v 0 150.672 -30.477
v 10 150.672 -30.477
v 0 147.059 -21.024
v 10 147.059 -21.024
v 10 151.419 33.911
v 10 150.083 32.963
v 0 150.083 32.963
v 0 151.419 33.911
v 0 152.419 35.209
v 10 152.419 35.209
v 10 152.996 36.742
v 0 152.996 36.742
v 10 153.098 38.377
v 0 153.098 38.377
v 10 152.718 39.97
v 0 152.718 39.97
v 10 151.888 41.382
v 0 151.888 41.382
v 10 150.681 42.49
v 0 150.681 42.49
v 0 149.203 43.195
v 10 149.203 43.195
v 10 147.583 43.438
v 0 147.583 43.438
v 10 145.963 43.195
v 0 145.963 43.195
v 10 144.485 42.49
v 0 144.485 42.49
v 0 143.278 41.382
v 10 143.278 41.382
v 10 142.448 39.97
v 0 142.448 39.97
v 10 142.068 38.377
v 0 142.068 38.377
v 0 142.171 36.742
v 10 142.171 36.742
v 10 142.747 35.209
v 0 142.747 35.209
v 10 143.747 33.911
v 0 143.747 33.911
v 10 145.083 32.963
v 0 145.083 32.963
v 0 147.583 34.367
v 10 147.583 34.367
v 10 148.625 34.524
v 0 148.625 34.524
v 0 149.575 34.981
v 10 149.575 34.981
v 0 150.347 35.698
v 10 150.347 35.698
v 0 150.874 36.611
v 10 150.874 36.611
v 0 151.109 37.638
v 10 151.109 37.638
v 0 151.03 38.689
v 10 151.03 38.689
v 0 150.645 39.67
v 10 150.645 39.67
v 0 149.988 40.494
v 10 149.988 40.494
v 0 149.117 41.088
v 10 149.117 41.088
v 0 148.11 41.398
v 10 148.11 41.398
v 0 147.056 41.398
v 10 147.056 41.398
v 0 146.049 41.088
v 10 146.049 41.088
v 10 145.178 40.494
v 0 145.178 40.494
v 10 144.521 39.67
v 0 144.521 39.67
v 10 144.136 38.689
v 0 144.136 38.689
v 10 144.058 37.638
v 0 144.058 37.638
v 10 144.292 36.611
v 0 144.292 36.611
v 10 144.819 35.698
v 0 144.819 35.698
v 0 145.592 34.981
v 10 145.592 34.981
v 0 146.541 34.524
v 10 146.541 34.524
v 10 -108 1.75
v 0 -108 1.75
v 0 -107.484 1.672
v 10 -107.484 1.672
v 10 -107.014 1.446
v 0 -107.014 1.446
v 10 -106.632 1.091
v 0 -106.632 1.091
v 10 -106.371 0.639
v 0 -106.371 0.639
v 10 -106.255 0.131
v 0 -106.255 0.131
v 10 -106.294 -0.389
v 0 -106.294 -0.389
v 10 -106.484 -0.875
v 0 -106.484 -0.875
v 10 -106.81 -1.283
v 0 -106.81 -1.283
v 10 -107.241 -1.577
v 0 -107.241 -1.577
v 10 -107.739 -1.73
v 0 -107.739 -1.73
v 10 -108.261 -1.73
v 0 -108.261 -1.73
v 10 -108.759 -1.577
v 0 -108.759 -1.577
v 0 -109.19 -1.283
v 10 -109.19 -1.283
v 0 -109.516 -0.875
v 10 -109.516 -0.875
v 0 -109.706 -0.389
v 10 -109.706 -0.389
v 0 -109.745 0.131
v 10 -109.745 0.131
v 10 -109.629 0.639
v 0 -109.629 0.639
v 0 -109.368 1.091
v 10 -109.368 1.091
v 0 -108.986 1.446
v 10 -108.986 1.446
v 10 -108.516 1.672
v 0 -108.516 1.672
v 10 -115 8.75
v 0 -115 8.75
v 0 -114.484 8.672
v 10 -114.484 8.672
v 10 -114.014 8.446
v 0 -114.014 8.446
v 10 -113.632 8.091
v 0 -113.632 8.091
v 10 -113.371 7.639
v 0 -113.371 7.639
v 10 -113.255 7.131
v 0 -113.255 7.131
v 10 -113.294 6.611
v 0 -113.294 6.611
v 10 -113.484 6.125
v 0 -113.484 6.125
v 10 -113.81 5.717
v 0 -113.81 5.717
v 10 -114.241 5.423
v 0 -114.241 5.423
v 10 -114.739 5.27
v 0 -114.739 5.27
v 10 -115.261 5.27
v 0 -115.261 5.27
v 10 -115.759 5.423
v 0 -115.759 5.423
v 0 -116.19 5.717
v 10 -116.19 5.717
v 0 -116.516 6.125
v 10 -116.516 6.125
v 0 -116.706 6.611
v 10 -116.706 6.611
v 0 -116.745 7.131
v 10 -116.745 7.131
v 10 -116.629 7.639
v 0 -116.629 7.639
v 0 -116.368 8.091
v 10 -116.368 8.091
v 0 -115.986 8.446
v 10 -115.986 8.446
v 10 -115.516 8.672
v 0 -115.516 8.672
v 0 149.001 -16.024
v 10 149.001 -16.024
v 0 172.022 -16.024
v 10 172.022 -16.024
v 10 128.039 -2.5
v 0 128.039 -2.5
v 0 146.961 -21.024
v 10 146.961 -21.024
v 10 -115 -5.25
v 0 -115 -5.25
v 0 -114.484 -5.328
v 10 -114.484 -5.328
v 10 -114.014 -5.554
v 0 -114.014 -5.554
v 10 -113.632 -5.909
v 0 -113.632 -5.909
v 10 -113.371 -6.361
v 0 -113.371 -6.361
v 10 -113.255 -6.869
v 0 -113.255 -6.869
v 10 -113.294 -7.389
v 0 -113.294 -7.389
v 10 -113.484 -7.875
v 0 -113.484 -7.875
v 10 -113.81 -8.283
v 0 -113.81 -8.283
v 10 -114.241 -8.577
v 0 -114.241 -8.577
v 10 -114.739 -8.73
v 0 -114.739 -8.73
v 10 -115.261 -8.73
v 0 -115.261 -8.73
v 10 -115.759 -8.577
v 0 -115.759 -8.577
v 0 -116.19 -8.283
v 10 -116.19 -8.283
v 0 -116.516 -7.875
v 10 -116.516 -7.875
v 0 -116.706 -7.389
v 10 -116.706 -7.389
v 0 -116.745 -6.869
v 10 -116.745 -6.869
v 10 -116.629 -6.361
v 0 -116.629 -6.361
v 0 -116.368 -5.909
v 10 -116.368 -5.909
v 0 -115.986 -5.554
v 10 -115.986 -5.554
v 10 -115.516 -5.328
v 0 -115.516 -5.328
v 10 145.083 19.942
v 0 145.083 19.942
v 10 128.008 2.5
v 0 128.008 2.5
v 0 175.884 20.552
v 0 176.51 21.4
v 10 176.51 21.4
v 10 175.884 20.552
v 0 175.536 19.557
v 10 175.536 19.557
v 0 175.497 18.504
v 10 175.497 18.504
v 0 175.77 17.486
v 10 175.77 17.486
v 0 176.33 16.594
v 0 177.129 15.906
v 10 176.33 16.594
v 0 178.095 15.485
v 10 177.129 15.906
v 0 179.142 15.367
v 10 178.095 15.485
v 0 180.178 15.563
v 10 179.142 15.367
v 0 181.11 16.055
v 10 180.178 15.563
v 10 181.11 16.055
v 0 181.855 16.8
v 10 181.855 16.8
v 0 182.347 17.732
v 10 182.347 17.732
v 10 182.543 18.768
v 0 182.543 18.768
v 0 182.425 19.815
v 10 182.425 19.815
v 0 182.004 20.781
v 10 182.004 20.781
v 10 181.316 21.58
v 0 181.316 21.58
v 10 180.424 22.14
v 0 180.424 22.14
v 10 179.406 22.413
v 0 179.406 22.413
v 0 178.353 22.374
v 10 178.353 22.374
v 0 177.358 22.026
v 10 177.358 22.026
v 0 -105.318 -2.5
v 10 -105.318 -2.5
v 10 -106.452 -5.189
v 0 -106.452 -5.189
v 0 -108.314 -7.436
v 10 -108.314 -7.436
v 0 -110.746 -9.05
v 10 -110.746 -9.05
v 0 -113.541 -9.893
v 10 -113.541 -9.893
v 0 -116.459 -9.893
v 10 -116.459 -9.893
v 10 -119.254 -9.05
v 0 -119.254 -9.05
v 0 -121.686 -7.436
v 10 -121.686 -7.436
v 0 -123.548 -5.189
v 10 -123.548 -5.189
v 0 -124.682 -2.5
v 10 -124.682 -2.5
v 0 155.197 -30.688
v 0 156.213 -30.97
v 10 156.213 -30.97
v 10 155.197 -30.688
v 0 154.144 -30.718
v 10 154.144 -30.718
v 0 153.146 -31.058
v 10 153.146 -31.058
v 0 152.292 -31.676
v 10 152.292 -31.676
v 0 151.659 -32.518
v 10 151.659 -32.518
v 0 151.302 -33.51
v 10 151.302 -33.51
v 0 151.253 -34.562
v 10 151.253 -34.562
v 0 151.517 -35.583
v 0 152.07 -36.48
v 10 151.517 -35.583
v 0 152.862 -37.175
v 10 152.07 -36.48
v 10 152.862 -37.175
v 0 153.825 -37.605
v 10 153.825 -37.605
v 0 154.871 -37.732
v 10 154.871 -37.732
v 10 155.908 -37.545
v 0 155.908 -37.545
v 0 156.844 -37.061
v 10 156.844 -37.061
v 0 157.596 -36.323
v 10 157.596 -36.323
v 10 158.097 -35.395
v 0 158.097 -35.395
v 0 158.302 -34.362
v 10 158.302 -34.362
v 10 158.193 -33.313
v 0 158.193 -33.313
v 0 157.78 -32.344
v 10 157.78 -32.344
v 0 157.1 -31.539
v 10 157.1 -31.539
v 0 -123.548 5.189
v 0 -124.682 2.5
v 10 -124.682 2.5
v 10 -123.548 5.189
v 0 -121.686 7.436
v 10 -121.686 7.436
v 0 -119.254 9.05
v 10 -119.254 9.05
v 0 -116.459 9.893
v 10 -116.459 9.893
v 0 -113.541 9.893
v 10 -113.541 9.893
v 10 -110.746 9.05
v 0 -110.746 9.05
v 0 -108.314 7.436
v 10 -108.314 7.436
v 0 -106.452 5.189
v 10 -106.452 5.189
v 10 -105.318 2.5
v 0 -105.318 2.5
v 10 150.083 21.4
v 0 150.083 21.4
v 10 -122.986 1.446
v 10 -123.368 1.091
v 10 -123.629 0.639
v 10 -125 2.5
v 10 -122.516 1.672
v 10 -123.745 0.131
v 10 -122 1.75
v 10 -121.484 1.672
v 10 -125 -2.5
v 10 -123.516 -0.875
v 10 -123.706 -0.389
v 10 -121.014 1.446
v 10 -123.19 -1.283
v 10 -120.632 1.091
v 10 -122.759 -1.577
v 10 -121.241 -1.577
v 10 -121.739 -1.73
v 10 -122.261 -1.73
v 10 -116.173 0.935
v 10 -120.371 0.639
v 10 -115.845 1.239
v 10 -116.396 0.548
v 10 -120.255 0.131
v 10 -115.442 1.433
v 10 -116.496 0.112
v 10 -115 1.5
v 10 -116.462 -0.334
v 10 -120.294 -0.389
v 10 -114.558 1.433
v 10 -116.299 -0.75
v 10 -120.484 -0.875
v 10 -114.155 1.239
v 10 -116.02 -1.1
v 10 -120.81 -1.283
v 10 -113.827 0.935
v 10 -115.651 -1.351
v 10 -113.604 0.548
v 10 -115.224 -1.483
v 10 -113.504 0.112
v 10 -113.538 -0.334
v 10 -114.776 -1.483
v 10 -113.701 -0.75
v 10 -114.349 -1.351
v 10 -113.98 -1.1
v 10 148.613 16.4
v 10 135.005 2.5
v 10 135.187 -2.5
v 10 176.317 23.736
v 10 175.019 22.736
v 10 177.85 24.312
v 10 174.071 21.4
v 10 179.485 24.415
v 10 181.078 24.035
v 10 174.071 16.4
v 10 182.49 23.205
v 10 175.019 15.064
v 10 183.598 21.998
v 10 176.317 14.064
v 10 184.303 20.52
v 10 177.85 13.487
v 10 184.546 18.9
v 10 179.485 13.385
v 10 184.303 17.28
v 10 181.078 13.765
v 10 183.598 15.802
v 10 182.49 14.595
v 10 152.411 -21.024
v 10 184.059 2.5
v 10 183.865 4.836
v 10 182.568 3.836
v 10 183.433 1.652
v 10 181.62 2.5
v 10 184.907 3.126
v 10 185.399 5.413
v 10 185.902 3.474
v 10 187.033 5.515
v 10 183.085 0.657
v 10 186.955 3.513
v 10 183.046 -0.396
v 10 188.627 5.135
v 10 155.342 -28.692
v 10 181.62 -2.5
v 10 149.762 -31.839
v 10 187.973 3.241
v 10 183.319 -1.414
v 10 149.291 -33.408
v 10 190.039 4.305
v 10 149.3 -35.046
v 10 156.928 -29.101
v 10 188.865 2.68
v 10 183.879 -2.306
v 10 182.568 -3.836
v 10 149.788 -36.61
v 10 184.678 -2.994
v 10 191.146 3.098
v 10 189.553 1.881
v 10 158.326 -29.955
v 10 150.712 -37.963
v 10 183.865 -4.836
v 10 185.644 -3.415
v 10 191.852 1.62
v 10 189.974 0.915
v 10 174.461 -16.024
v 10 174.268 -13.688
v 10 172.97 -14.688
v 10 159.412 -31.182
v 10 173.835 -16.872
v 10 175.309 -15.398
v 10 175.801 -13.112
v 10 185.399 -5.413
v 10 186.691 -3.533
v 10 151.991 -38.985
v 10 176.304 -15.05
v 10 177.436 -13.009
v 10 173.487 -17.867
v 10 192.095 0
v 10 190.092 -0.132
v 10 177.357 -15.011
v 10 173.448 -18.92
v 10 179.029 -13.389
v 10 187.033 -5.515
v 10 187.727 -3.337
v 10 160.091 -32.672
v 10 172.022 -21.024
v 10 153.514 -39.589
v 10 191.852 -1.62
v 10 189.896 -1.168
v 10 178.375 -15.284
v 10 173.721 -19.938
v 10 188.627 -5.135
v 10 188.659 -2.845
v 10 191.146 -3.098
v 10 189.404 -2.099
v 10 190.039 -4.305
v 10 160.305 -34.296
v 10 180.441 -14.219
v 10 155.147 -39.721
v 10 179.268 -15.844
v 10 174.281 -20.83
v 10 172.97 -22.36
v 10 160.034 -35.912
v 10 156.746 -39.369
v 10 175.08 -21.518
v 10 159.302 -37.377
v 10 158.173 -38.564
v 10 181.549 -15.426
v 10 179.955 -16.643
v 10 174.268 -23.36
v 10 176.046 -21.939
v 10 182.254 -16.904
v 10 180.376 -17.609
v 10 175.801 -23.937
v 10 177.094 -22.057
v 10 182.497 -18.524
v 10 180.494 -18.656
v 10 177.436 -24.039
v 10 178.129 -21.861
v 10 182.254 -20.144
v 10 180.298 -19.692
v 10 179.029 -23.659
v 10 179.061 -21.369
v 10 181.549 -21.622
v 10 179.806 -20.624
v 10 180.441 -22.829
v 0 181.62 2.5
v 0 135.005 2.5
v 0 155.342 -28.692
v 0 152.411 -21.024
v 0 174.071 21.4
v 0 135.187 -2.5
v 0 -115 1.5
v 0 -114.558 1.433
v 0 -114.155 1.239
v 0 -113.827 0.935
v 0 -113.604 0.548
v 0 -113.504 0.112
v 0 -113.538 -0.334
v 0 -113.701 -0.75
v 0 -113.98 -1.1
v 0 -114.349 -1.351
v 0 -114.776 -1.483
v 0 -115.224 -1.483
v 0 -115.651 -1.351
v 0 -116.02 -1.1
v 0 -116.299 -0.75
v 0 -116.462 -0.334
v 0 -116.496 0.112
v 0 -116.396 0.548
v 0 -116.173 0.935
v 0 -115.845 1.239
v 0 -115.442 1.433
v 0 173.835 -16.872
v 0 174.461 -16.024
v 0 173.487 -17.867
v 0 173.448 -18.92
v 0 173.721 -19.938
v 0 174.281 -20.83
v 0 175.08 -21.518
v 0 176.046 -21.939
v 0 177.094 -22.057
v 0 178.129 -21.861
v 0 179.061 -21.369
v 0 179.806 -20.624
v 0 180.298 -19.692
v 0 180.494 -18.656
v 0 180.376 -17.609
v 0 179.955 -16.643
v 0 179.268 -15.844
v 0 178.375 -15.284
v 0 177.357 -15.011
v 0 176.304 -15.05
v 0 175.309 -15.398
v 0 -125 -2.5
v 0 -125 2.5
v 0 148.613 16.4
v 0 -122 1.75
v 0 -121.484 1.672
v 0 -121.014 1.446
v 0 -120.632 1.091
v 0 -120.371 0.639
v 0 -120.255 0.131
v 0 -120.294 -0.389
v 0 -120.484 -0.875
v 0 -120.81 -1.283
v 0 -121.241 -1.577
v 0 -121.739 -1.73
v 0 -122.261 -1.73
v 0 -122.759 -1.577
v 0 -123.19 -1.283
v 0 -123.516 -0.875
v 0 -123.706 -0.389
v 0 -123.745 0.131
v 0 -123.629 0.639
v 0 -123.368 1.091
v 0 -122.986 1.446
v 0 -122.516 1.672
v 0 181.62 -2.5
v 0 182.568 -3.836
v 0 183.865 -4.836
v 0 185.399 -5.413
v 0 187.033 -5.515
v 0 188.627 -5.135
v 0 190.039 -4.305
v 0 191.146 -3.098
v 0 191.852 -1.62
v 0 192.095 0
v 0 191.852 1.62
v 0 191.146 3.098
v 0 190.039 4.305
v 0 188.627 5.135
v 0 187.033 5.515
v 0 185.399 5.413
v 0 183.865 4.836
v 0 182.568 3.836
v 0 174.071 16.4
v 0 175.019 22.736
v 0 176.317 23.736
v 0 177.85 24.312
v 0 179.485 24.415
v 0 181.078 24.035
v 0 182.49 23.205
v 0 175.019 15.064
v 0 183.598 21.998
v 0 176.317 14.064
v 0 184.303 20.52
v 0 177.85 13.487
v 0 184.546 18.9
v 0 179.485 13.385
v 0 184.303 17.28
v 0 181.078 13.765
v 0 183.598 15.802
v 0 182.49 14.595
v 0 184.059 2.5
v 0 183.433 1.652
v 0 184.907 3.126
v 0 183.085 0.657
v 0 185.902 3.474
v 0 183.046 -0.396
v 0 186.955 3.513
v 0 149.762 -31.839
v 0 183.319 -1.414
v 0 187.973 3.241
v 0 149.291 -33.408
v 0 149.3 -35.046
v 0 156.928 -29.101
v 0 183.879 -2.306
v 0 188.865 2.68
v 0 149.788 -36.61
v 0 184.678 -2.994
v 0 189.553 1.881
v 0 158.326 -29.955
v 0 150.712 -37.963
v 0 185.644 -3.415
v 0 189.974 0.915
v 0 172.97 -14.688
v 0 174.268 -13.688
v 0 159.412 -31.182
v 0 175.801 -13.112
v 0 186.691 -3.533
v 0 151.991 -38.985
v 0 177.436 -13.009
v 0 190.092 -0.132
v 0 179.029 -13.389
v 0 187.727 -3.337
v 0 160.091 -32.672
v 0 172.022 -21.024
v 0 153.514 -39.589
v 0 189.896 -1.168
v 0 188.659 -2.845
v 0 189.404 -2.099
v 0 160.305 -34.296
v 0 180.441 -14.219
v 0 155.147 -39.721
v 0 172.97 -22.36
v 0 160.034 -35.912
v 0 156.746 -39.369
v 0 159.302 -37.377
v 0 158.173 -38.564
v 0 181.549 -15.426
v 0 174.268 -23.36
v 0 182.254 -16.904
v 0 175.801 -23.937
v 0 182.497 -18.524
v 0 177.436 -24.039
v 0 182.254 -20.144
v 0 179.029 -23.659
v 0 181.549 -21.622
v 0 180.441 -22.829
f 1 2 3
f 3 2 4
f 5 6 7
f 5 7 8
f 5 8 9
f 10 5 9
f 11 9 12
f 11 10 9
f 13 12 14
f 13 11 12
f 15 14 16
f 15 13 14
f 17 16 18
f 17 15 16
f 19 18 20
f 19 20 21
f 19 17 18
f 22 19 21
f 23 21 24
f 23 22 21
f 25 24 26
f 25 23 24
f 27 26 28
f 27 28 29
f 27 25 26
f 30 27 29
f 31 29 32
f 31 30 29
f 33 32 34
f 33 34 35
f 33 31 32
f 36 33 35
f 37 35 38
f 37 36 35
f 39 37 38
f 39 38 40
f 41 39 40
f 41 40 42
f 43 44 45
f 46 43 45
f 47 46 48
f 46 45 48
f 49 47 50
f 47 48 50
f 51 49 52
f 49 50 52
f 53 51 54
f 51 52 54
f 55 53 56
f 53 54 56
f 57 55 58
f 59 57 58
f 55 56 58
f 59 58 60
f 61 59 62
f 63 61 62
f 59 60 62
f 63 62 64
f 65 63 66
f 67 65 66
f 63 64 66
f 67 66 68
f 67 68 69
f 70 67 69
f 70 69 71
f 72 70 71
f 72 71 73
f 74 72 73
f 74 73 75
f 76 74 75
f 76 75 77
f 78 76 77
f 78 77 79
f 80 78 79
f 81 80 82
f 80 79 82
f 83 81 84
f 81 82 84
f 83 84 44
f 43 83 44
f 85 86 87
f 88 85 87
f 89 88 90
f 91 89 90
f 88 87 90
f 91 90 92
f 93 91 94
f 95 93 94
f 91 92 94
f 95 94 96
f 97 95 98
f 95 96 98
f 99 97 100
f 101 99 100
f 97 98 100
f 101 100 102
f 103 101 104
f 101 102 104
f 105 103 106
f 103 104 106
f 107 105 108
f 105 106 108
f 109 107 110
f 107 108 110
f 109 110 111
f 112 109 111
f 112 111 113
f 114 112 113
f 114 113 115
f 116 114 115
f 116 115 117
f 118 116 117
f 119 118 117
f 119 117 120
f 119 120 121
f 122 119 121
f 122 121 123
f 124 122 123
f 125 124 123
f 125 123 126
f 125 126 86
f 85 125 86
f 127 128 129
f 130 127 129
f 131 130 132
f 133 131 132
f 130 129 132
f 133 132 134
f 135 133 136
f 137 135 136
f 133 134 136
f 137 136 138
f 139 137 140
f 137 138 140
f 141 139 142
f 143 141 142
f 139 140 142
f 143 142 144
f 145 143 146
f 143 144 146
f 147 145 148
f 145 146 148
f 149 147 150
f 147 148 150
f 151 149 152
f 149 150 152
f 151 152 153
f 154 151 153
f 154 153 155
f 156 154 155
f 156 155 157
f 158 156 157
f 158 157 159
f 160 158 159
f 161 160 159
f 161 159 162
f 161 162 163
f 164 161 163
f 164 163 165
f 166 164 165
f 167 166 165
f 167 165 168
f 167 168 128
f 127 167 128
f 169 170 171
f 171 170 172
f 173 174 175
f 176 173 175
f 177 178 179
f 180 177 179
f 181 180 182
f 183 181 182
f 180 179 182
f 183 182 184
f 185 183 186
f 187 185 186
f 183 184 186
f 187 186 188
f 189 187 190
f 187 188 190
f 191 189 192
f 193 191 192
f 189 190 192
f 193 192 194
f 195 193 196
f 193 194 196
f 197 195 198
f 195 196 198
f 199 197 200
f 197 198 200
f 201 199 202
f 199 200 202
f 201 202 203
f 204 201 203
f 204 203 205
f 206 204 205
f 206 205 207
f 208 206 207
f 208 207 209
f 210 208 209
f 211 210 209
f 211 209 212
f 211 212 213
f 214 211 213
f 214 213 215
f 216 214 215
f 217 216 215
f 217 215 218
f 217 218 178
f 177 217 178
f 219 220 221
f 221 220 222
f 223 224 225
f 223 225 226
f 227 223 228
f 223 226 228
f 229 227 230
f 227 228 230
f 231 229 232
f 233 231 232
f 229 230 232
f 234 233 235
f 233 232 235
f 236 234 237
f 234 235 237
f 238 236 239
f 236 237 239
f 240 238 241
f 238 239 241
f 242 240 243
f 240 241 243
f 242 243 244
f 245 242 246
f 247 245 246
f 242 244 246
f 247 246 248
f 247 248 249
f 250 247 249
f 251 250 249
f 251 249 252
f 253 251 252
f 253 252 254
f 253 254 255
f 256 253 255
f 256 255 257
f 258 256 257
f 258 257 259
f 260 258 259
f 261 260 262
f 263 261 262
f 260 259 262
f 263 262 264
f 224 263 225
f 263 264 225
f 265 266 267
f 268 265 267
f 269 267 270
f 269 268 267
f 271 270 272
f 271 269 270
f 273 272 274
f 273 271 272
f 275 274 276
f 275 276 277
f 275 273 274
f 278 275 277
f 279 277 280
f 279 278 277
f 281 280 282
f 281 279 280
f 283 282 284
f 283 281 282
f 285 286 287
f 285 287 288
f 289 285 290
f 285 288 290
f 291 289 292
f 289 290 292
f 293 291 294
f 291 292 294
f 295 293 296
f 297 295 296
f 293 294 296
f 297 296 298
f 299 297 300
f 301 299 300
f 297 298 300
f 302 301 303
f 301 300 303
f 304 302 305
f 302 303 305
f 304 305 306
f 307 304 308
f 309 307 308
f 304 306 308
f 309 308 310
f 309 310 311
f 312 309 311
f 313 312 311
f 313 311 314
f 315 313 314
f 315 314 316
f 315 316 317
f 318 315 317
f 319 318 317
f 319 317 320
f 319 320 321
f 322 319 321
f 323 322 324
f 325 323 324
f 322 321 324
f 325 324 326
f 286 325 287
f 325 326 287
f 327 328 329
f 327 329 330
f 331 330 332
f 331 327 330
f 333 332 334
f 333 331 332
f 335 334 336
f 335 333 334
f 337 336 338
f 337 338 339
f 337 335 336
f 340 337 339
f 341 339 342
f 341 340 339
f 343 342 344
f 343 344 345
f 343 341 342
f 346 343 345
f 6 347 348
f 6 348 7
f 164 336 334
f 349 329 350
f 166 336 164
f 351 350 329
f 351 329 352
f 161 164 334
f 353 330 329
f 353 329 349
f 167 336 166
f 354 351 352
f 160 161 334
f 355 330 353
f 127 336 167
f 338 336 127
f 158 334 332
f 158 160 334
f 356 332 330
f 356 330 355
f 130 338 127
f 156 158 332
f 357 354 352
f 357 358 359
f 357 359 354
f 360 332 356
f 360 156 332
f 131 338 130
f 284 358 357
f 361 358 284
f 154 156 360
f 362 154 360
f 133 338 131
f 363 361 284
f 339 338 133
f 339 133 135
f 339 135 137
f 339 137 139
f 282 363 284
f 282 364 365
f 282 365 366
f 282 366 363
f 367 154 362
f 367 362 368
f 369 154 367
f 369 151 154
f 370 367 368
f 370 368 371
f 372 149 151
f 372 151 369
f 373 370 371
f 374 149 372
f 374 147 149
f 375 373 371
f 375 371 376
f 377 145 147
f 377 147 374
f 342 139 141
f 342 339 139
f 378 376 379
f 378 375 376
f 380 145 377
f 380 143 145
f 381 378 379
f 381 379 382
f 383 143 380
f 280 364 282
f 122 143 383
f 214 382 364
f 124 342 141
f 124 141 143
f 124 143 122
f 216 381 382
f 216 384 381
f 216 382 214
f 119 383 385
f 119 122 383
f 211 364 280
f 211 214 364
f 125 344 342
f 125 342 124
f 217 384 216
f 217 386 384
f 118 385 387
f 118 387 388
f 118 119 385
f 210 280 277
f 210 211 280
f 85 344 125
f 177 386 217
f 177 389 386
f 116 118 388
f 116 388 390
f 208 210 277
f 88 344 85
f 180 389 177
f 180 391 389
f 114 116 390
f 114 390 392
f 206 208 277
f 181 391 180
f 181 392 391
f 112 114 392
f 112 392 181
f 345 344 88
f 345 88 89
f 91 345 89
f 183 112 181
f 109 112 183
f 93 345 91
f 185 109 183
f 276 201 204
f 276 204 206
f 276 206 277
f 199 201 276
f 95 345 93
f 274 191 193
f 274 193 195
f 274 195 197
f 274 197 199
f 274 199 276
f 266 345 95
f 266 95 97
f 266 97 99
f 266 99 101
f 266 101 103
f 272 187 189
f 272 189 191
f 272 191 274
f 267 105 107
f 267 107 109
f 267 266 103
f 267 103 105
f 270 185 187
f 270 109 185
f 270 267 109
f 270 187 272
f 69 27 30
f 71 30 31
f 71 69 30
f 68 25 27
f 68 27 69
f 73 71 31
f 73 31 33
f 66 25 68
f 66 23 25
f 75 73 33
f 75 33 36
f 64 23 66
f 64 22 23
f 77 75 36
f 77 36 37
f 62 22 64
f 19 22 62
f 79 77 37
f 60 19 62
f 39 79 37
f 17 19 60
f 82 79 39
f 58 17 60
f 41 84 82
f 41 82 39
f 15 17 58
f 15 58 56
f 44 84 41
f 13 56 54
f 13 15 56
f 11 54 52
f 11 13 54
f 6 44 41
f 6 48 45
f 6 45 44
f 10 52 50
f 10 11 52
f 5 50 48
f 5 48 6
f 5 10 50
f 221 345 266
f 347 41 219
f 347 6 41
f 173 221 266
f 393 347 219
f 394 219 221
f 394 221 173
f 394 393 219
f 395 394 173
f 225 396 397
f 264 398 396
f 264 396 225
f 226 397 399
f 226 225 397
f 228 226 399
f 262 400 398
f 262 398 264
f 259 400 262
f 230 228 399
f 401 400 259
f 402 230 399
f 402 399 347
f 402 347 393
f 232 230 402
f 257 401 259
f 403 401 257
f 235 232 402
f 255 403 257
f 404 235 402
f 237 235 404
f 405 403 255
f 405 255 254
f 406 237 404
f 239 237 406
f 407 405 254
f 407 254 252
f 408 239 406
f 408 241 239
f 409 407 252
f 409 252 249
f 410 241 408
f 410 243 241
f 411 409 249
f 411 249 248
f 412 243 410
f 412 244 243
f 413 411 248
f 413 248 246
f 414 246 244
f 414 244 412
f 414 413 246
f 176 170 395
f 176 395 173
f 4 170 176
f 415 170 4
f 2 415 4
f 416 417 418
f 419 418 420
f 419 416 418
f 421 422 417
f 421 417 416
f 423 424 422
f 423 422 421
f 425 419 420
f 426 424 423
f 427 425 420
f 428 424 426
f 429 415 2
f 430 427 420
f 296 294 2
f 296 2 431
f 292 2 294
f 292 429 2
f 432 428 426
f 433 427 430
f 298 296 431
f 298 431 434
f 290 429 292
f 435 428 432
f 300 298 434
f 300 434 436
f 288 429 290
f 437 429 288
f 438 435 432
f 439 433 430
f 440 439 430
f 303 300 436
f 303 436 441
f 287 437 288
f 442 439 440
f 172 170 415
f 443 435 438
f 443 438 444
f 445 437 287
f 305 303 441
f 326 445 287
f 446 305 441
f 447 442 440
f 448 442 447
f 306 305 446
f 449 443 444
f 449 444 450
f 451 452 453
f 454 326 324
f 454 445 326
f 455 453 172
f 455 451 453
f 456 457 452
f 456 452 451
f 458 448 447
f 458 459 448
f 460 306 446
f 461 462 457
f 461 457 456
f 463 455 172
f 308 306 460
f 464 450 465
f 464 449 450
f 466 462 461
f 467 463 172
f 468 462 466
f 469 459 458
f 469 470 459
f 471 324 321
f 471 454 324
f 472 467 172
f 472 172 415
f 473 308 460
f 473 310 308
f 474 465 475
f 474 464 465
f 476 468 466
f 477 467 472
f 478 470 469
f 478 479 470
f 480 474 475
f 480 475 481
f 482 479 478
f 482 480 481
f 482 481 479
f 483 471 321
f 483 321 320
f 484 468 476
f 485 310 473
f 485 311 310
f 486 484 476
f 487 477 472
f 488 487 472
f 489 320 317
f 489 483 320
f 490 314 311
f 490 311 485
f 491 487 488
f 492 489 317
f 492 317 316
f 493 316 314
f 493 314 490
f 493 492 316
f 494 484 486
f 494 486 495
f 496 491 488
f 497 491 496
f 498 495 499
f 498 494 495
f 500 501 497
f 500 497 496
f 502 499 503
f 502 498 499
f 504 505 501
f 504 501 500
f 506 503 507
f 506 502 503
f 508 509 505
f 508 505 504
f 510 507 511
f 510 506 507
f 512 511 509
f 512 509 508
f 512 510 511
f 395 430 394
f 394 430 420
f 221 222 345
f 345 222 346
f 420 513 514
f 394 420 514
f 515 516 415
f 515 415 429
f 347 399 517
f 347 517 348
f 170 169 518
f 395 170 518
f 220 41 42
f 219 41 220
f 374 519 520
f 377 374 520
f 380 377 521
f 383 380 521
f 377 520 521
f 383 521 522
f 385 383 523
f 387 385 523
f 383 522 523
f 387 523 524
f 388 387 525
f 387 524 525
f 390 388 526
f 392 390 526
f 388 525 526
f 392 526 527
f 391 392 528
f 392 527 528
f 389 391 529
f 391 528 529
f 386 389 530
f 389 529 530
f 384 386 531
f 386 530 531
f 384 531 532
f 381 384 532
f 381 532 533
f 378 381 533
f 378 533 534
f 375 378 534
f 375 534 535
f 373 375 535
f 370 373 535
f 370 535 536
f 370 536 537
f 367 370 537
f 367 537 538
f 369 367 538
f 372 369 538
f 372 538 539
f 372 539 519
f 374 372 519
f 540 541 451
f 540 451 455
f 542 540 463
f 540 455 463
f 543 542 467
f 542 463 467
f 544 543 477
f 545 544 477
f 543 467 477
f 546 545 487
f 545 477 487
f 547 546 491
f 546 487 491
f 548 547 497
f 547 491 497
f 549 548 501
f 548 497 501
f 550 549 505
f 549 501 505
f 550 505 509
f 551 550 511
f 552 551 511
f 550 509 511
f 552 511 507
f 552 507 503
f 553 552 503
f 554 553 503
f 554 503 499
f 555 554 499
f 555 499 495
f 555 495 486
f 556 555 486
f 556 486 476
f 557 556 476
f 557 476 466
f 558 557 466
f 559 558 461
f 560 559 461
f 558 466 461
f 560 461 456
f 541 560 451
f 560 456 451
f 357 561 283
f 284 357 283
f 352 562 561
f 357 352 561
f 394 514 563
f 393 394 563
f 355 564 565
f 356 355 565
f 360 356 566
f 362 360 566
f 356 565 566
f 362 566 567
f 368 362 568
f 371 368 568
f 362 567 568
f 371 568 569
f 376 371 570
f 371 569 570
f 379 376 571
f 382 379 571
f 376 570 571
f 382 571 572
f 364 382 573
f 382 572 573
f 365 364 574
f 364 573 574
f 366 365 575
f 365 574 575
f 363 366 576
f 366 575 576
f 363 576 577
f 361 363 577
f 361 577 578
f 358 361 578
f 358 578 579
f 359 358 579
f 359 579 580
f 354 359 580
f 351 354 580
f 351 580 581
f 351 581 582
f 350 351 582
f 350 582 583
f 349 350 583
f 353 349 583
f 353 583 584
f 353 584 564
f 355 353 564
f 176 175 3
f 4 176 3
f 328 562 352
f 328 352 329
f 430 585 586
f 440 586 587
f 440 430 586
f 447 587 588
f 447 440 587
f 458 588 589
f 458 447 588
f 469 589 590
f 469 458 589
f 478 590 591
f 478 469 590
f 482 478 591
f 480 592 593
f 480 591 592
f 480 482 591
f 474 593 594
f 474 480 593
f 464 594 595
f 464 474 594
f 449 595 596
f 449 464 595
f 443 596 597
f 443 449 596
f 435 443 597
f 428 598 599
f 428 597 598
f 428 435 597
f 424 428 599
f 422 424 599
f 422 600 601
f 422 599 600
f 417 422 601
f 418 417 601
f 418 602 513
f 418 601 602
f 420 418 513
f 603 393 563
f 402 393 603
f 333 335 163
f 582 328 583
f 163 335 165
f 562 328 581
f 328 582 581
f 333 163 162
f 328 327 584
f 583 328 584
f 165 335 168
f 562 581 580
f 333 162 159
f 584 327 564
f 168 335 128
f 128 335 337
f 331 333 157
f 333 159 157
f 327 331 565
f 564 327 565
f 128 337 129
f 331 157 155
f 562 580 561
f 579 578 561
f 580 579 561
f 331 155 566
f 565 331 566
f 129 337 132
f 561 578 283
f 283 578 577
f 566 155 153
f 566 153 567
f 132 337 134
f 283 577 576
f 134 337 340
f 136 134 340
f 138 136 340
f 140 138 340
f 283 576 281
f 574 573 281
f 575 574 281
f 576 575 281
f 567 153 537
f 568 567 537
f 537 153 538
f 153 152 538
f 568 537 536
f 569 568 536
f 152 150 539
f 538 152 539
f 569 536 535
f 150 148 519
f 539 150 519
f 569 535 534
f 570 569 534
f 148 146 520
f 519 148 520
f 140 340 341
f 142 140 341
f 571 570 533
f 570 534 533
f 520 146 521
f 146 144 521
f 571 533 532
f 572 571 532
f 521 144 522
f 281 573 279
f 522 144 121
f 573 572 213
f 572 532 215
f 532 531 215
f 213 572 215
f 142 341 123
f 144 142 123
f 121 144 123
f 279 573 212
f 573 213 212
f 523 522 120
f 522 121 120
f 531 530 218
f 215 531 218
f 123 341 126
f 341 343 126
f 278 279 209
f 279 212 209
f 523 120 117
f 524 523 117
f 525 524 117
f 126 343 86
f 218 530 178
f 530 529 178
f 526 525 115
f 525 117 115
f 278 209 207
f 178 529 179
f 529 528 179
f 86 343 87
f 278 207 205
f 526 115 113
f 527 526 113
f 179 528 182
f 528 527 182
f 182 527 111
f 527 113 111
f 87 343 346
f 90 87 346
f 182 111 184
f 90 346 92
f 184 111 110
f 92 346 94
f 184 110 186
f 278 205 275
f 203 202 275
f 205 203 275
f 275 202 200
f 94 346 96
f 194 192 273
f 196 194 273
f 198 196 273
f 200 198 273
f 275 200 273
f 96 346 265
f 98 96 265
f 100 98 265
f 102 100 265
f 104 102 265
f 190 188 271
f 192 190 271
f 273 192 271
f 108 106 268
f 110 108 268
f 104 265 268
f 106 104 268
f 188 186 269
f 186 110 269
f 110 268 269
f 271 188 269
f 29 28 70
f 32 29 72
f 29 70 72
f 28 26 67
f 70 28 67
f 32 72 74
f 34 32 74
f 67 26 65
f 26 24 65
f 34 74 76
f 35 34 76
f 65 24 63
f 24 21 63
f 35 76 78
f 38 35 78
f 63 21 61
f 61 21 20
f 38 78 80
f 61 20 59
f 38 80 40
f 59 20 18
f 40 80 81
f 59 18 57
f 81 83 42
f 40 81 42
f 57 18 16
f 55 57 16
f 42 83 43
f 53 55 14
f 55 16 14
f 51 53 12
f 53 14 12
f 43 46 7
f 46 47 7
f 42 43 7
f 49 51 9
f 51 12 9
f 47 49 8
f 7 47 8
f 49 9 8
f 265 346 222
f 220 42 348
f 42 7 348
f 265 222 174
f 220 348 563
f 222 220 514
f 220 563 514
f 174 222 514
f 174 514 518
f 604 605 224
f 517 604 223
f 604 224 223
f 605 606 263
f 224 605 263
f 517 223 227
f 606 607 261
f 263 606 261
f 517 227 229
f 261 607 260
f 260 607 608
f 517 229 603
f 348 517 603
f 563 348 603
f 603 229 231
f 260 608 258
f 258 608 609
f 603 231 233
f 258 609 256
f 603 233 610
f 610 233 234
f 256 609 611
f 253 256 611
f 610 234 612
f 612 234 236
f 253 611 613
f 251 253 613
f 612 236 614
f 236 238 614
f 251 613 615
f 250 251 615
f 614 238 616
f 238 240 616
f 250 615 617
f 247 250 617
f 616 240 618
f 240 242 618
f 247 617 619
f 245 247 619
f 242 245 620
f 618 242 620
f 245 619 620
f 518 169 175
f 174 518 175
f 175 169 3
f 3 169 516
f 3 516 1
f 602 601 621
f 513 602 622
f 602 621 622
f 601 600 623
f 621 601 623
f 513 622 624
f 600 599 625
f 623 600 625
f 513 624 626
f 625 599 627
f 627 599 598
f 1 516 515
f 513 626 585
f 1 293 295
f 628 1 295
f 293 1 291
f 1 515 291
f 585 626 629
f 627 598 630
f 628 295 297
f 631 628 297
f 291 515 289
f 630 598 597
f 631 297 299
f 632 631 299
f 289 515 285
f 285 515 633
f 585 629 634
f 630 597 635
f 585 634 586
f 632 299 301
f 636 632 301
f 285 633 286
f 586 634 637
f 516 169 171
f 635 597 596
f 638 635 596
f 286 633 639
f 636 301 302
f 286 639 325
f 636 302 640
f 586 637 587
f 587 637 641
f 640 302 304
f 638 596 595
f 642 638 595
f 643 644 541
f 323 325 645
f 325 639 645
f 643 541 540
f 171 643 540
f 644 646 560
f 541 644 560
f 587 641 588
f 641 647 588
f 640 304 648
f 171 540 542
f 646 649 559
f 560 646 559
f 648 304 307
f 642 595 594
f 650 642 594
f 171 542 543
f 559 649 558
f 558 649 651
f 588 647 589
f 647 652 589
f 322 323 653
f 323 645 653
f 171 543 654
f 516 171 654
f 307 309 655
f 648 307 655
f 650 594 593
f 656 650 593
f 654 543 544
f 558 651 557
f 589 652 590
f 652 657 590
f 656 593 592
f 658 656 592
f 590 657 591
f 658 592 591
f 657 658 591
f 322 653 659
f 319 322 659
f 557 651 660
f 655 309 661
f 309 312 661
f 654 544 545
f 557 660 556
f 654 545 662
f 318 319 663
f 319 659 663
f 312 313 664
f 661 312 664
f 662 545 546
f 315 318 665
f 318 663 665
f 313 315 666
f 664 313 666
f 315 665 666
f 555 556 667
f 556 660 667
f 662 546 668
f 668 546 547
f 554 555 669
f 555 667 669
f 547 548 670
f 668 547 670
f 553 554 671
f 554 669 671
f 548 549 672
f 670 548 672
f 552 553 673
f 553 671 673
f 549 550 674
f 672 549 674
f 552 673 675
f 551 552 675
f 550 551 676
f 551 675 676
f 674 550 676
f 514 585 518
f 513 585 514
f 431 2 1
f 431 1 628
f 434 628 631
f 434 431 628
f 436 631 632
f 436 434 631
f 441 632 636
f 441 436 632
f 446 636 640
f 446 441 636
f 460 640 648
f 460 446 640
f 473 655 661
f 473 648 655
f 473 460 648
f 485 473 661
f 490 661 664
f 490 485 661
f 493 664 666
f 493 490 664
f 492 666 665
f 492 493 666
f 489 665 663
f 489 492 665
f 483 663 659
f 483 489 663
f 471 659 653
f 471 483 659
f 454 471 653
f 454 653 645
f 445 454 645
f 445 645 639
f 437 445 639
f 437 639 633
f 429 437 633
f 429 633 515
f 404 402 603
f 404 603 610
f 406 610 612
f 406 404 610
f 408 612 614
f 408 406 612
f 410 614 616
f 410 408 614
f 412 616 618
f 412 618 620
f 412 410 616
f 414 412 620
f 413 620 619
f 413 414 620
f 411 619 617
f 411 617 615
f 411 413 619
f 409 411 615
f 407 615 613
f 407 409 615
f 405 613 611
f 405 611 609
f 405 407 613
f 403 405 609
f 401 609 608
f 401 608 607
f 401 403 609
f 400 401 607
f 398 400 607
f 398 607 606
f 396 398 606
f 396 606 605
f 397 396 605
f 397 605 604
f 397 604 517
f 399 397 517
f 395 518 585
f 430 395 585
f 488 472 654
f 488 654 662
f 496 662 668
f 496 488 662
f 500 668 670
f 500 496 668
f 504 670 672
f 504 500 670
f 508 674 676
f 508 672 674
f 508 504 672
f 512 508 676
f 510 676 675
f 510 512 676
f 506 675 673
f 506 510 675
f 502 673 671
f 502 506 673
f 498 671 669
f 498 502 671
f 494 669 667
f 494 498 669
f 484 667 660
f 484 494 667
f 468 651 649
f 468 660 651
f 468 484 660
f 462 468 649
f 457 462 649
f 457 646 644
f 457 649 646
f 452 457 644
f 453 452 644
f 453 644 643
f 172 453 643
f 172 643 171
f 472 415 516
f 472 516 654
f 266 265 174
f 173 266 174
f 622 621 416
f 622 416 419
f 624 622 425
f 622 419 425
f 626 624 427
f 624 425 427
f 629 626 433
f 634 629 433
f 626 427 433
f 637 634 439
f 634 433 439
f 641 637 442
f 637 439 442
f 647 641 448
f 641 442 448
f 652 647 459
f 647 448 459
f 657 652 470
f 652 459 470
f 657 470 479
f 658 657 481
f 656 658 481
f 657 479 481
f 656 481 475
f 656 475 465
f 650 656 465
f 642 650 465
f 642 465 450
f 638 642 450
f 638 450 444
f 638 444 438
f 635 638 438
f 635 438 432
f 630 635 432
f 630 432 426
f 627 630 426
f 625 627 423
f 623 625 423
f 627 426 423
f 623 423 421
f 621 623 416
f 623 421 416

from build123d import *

# Parameters (mm, degrees)
SKETCH1_W           = 5
SKETCH1_H           = 250
BOSS_EXTRUDE1_DEPTH = 10
SKETCH3_R           = 10
BOSS_EXTRUDE2_DEPTH = 10
SKETCH4_R           = 1.5
SKETCH4_R_2         = 1.75
CUT_EXTRUDE1_DEPTH  = 23
EXTRUDE_THIN5_START = -10
EXTRUDE_THIN5_DEPTH = 10
SKETCH10_W          = 5
SKETCH10_H          = 27.5
BOSS_EXTRUDE3_DEPTH = 10
BOSS_EXTRUDE4_DEPTH = 10
SKETCH12_R          = 5.535533906
SKETCH12_R_2        = 3.535533906
EXTRUDE_THIN6_DEPTH = 10
SKETCH14_R          = 3.535533906
CUT_EXTRUDE2_DEPTH  = 10


# Read off the part's stored shape, not the designer's step: Extrude-Thin5
with BuildPart() as part:
    # Sketch1 → Boss-Extrude1 (new body)
    with BuildSketch(Plane(origin=(0, 0, 0), x_dir=(0, 0, -1), z_dir=(1, 0, 0))):
        Rectangle(SKETCH1_W, SKETCH1_H)
    extrude(amount=BOSS_EXTRUDE1_DEPTH)

    # Sketch3 → Boss-Extrude2 (add)
    with BuildSketch(Plane.ZY):
        with Locations((0, -115)):
            Circle(SKETCH3_R)
    extrude(amount=-BOSS_EXTRUDE2_DEPTH)

    # Sketch4 → Cut-Extrude1 (cut)
    with BuildSketch(Plane.ZY):
        with Locations((0, -115)):
            Circle(SKETCH4_R)
        with Locations((-7, -115)):
            Circle(SKETCH4_R_2)
        with Locations((0, -108)):
            Circle(SKETCH4_R_2)
        with Locations((7, -115)):
            Circle(SKETCH4_R_2)
        with Locations((0, -122)):
            Circle(SKETCH4_R_2)
    extrude(amount=-CUT_EXTRUDE1_DEPTH, mode=Mode.SUBTRACT)

    # Extrude-Thin5 outline → Extrude-Thin5 (add)
    with BuildSketch(Plane(origin=(10, 0, 0), x_dir=(0, 0, -1), z_dir=(1, 0, 0)).offset(EXTRUDE_THIN5_START)):
        Polygon((17.451133042, 150.459060521), (2.5, 135.186573848), (2.5, 184.059108288), (-2.5, 184.059108288), (-2.5, 135.005040385), (-17.902207713, 150.083164962), (-21.399952233, 146.51024133), (-2.5, 128.007969476), (-2.5, 125), (2.5, 125), (2.5, 128.039110715), (21.024056673, 146.961316001), align=None)
    extrude(amount=EXTRUDE_THIN5_DEPTH)

    # Sketch10 → Boss-Extrude3 (add)
    with BuildSketch(Plane(origin=(10, 0, 0), x_dir=(0, 0, -1), z_dir=(1, 0, 0))):
        with Locations((18.524056673, 160.711316001)):
            Rectangle(SKETCH10_W, SKETCH10_H)
        Polygon((30.970200678, 156.21277045), (32.755260524, 151.542271403), (18.743763382, 146.187091867), (16.958703537, 150.857590914), align=None)
    extrude(amount=-BOSS_EXTRUDE3_DEPTH)

    # Sketch11 → Boss-Extrude4 (add)
    with BuildSketch(Plane(origin=(10, 0, 0), x_dir=(0, 0, -1), z_dir=(1, 0, 0))):
        Polygon((-21.399952233, 176.51024133), (-21.399952233, 150.083164962), (-17.902207713, 150.083164962), (-16.399952233, 148.612518954), (-16.399952233, 176.51024133), align=None)
        Polygon((-17.902207713, 150.083164962), (-21.399952233, 146.51024133), (-17.902207713, 146.51024133), align=None)
        Polygon((-21.399952233, 150.083164962), (-21.399952233, 146.51024133), (-17.902207713, 150.083164962), align=None)
        Polygon((-17.902207713, 150.083164962), (-17.902207713, 146.51024133), (-16.399952233, 146.51024133), (-16.399952233, 148.612518954), align=None)
        Polygon((-19.942202859, 145.083164962), (-21.399952233, 146.51024133), (-21.399952233, 150.083164962), (-35.402207713, 150.083164962), (-35.402207713, 145.083164962), align=None)
        Polygon((-17.902207713, 146.51024133), (-21.399952233, 146.51024133), (-19.942202859, 145.083164962), (-17.902207713, 145.083164962), align=None)
    extrude(amount=-BOSS_EXTRUDE4_DEPTH)

    # Sketch12 → Extrude-Thin6 (add)
    # profile 1 of 5: a face of its own
    with BuildSketch(Plane(origin=(10, 0, 0), x_dir=(0, 0, -1), z_dir=(1, 0, 0))):
        with Locations((-18.899952233, 179.01024133)):
            Circle(SKETCH12_R)
        with Locations((-18.899952233, 179.01024133)):
            Circle(SKETCH12_R_2, mode=Mode.SUBTRACT)
    # profile 2 of 5: a face of its own
    with BuildSketch(Plane(origin=(10, 0, 0), x_dir=(0, 0, -1), z_dir=(1, 0, 0))):
        with Locations((0, 186.559108288)):
            Circle(SKETCH12_R)
        with Locations((0, 186.559108288)):
            Circle(SKETCH12_R_2, mode=Mode.SUBTRACT)
    # profile 3 of 5: a face of its own
    with BuildSketch(Plane(origin=(10, 0, 0), x_dir=(0, 0, -1), z_dir=(1, 0, 0))):
        with Locations((18.524056673, 176.961316001)):
            Circle(SKETCH12_R)
        with Locations((18.524056673, 176.961316001)):
            Circle(SKETCH12_R_2, mode=Mode.SUBTRACT)
    # profile 4 of 5: a face of its own
    with BuildSketch(Plane(origin=(10, 0, 0), x_dir=(0, 0, -1), z_dir=(1, 0, 0))):
        with Locations((34.197980125, 154.770050849)):
            Circle(SKETCH12_R)
        with Locations((34.197980125, 154.770050849)):
            Circle(SKETCH12_R_2, mode=Mode.SUBTRACT)
    # profile 5 of 5: a face of its own
    with BuildSketch(Plane(origin=(10, 0, 0), x_dir=(0, 0, -1), z_dir=(1, 0, 0))):
        with Locations((-37.902207713, 147.583164962)):
            Circle(SKETCH12_R)
        with Locations((-37.902207713, 147.583164962)):
            Circle(SKETCH12_R_2, mode=Mode.SUBTRACT)
    extrude(amount=-EXTRUDE_THIN6_DEPTH)

    # Sketch14 → Cut-Extrude2 (cut)
    with BuildSketch(Plane(origin=(10, 0, 0), x_dir=(0, 0, -1), z_dir=(1, 0, 0))):
        with Locations((-37.902207713, 147.583164962)):
            Circle(SKETCH14_R)
        with Locations((-18.899952233, 179.01024133)):
            Circle(SKETCH14_R)
        with Locations((0, 186.559108288)):
            Circle(SKETCH14_R)
        with Locations((18.524056673, 176.961316001)):
            Circle(SKETCH14_R)
        with Locations((34.197980125, 154.770050849)):
            Circle(SKETCH14_R)
    extrude(amount=-CUT_EXTRUDE2_DEPTH, mode=Mode.SUBTRACT)


solid = part.part
